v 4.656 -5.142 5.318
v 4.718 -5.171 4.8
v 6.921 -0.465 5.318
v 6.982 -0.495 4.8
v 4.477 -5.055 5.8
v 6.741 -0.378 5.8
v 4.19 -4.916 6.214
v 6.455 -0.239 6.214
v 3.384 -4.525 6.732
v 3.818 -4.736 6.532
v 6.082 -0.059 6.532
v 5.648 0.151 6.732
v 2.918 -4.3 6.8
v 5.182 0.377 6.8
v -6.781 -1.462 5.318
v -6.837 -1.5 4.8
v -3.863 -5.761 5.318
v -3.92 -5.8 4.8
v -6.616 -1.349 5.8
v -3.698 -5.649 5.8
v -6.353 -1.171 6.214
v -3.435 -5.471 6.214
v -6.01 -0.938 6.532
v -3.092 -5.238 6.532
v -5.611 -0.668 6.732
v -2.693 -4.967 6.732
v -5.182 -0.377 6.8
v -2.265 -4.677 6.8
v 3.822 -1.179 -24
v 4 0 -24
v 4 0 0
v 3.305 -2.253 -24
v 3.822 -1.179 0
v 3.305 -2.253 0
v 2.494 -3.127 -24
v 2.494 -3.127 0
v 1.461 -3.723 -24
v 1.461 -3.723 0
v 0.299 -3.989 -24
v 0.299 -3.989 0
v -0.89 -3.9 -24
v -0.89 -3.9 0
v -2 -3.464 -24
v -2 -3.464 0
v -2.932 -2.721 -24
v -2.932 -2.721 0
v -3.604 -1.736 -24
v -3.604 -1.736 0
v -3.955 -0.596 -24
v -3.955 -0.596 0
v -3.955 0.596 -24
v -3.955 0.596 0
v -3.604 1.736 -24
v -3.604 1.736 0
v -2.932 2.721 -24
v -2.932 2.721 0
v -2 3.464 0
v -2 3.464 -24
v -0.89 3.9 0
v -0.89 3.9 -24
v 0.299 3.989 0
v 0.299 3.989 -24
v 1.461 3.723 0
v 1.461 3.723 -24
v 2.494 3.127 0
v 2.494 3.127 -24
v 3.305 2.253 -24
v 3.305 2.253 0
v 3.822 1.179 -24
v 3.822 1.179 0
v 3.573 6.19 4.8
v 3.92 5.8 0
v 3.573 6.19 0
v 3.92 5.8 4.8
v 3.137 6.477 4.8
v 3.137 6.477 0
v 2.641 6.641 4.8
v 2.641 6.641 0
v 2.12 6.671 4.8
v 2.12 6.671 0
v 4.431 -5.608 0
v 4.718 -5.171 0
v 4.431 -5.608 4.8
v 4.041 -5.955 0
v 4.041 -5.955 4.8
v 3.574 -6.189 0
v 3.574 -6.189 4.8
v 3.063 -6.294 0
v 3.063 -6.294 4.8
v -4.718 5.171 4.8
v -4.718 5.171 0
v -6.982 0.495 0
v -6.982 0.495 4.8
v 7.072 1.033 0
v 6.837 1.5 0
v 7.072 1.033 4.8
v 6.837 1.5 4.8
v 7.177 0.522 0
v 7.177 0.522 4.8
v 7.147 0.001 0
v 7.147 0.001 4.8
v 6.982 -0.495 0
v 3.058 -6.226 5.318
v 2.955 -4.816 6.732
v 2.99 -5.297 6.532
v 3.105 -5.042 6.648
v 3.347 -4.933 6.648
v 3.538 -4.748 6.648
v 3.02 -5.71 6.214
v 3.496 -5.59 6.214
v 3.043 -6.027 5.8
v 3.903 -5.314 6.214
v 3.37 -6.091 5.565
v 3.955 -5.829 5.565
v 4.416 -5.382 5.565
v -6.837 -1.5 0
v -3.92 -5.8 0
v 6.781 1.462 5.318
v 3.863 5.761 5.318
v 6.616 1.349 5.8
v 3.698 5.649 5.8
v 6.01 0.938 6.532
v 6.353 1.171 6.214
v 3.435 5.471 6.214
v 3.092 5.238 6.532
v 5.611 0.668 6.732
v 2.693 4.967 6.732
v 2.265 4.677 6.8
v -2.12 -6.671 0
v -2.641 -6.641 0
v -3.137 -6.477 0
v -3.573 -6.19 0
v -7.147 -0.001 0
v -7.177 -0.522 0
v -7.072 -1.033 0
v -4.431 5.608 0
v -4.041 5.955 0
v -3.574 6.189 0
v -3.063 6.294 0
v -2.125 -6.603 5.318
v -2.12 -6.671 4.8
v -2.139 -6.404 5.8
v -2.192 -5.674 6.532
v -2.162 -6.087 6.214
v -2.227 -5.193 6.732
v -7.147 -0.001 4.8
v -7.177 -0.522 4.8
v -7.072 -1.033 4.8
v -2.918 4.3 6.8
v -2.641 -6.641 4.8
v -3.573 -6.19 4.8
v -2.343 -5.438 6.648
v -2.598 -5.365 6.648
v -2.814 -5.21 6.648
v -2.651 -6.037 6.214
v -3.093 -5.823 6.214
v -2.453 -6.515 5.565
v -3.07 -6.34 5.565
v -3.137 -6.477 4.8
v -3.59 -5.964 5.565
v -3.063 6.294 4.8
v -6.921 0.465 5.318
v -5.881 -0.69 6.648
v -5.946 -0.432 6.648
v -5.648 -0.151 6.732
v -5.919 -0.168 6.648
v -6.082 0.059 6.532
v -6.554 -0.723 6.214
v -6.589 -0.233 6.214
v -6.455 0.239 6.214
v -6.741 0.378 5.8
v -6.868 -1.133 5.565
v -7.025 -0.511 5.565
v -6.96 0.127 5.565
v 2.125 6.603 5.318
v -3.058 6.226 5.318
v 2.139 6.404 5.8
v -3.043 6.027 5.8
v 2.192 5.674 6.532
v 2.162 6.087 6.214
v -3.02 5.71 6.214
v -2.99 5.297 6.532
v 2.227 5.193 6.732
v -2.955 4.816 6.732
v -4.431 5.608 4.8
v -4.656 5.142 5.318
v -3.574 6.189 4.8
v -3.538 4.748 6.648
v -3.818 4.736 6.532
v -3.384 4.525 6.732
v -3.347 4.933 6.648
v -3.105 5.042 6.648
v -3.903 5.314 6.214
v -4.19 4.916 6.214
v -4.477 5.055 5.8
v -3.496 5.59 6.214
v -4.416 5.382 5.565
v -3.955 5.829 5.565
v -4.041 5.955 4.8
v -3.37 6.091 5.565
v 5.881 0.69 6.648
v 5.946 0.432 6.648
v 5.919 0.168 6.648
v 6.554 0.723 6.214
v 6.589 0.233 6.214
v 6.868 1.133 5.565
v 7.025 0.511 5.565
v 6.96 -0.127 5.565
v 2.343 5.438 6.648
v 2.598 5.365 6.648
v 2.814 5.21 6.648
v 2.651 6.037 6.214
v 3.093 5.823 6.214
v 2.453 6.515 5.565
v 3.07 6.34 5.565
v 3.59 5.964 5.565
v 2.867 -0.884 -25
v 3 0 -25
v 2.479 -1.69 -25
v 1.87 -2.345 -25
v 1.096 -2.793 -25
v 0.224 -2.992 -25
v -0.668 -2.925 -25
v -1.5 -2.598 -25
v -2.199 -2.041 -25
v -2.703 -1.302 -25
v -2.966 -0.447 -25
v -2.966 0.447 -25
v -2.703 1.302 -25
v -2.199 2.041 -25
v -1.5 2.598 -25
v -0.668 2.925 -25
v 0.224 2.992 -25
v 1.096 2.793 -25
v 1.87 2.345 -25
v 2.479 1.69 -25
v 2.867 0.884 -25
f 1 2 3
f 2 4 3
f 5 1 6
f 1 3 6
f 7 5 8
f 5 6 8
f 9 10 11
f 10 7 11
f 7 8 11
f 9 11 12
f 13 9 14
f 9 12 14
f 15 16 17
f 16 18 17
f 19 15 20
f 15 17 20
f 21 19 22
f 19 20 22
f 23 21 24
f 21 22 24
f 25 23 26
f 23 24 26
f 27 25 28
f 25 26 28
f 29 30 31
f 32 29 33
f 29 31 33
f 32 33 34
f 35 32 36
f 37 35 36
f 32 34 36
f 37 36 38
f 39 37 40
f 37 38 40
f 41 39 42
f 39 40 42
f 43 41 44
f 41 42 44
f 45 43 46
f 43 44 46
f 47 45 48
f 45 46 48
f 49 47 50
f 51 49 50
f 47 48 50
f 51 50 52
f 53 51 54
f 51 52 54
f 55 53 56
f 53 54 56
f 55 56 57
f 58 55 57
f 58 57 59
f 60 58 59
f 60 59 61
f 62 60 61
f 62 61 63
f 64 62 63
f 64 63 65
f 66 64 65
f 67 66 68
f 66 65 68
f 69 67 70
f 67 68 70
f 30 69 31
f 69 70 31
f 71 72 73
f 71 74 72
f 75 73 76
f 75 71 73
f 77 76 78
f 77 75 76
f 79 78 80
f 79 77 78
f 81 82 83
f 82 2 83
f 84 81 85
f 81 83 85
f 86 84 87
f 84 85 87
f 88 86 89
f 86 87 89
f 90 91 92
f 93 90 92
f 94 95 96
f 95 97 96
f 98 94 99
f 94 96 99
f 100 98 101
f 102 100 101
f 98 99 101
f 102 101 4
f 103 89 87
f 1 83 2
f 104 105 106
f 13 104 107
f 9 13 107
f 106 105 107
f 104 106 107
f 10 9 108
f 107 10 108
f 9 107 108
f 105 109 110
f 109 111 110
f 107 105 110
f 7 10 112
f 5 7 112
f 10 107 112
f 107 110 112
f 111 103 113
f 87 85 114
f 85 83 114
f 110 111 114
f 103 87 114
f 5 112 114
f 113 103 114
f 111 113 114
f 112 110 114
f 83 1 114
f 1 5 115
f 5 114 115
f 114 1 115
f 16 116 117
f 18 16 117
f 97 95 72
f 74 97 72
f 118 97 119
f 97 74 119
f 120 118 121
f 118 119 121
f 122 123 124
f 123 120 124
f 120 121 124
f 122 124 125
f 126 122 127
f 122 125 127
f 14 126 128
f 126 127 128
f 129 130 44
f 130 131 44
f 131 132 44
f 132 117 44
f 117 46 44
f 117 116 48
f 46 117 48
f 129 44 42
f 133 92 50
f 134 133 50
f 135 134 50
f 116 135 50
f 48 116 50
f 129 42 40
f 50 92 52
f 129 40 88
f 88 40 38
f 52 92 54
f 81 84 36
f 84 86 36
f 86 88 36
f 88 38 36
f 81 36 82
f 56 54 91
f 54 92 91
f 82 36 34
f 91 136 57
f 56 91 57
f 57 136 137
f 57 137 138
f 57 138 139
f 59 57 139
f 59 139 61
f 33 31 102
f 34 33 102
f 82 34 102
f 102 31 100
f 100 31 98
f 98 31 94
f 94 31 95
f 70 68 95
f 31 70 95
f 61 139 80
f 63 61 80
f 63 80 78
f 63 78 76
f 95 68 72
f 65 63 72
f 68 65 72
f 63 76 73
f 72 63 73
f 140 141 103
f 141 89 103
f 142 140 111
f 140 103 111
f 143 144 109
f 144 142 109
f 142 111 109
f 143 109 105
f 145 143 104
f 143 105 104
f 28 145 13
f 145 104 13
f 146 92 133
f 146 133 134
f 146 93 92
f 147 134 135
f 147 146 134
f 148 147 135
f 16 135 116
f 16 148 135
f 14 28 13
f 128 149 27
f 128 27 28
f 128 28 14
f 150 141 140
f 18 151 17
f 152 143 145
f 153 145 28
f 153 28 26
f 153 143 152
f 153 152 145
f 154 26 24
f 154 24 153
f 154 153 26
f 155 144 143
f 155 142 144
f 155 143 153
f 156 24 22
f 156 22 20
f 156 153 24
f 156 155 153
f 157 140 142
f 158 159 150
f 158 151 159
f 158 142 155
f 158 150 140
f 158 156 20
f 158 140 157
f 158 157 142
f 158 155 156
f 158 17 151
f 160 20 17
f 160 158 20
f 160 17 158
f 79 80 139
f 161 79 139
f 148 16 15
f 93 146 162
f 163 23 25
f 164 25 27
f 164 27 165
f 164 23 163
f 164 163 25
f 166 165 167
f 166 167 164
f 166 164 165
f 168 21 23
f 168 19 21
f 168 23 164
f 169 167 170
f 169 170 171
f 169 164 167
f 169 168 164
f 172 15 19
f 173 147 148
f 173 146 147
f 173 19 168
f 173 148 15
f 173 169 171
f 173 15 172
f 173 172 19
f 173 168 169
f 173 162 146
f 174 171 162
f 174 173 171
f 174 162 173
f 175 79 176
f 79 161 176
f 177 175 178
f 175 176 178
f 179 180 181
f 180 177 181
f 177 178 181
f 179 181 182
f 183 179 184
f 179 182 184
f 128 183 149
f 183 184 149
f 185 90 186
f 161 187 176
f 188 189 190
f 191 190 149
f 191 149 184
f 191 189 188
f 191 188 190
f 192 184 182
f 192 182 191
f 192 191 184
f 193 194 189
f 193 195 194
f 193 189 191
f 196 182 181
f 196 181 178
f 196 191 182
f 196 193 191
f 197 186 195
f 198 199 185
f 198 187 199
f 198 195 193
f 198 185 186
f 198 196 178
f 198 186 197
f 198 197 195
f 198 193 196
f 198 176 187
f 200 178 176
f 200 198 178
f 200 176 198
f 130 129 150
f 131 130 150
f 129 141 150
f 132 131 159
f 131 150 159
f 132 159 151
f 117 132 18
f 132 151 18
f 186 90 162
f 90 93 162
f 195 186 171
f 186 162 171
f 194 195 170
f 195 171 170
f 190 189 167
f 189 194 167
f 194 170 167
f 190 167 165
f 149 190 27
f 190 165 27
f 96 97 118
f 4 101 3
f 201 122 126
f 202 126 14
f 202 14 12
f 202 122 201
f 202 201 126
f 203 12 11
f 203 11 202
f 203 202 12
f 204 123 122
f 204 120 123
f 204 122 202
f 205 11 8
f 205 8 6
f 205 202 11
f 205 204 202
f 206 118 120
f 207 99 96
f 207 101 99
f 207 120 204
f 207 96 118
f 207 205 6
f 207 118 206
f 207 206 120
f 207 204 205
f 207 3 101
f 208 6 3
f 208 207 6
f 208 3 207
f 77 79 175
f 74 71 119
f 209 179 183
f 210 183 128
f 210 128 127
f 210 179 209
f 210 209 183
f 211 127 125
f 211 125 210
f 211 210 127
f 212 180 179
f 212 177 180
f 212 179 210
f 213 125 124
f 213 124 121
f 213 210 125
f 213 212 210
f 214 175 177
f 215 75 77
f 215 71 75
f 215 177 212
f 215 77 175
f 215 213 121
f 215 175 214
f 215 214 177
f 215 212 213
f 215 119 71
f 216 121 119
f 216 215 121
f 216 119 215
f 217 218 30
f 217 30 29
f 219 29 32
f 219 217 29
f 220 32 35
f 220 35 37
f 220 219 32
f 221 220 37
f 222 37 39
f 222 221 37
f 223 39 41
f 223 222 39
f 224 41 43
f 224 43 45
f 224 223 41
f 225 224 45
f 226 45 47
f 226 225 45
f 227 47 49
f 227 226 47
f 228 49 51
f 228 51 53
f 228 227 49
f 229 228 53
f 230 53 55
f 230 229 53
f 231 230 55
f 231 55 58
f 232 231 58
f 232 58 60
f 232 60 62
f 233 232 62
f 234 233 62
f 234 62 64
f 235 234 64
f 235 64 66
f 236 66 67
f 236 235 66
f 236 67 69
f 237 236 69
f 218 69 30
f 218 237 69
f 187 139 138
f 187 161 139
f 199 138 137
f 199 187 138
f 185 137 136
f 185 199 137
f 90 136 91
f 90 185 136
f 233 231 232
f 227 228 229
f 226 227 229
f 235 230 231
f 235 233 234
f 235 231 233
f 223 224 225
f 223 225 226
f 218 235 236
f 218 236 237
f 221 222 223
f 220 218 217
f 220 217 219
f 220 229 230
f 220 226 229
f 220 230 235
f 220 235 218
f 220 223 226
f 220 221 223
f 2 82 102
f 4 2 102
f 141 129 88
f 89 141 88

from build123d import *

# Parameters (mm, degrees)
F1_DEPTH = 6.8
F2_R     = 4
F3_DEPTH = 25
F4_SIZE  = 1
F5_R     = 2


with BuildPart() as f1:
    # F0 (on Top) → F1 (new body)
    with BuildSketch(Plane.XY):
        Polygon((7.485782, 0.544427), (3.271403, 6.755091), (-4.214379, 6.210664), (-7.485782, -0.544427), (-3.271403, -6.755091), (4.214379, -6.210664), align=None)
    extrude(amount=F1_DEPTH)

    # F2 (on face) → F3 (join)
    with BuildSketch(Plane(origin=(0, 0, 0), x_dir=(1, 0, 0), z_dir=(0, 0, -1))):
        Circle(F2_R)
    extrude(amount=F3_DEPTH)

    # F4
    f4_edges = [f1.edges().sort_by_distance(p)[0] for p in [
        (-4, 0, -25),
    ]]
    chamfer(f4_edges, length=F4_SIZE)

    # F5
    f5_edges = [f1.edges().sort_by_distance(p)[0] for p in [
        (0.471488, -6.482877, 6.8),
        (-5.378592, -3.649759, 6.8),
        (-5.85008, 2.833118, 6.8),
        (-0.471488, 6.482877, 6.8),
        (5.378592, 3.649759, 6.8),
        (5.85008, -2.833118, 6.8),
        (7.485782, 0.544427, 3.4),
        (4.214379, -6.210664, 3.4),
        (-3.271403, -6.755091, 3.4),
        (-7.485782, -0.544427, 3.4),
        (-4.214379, 6.210664, 3.4),
        (3.271403, 6.755091, 3.4),
    ]]
    fillet(f5_edges, radius=F5_R)


solid = f1.part
